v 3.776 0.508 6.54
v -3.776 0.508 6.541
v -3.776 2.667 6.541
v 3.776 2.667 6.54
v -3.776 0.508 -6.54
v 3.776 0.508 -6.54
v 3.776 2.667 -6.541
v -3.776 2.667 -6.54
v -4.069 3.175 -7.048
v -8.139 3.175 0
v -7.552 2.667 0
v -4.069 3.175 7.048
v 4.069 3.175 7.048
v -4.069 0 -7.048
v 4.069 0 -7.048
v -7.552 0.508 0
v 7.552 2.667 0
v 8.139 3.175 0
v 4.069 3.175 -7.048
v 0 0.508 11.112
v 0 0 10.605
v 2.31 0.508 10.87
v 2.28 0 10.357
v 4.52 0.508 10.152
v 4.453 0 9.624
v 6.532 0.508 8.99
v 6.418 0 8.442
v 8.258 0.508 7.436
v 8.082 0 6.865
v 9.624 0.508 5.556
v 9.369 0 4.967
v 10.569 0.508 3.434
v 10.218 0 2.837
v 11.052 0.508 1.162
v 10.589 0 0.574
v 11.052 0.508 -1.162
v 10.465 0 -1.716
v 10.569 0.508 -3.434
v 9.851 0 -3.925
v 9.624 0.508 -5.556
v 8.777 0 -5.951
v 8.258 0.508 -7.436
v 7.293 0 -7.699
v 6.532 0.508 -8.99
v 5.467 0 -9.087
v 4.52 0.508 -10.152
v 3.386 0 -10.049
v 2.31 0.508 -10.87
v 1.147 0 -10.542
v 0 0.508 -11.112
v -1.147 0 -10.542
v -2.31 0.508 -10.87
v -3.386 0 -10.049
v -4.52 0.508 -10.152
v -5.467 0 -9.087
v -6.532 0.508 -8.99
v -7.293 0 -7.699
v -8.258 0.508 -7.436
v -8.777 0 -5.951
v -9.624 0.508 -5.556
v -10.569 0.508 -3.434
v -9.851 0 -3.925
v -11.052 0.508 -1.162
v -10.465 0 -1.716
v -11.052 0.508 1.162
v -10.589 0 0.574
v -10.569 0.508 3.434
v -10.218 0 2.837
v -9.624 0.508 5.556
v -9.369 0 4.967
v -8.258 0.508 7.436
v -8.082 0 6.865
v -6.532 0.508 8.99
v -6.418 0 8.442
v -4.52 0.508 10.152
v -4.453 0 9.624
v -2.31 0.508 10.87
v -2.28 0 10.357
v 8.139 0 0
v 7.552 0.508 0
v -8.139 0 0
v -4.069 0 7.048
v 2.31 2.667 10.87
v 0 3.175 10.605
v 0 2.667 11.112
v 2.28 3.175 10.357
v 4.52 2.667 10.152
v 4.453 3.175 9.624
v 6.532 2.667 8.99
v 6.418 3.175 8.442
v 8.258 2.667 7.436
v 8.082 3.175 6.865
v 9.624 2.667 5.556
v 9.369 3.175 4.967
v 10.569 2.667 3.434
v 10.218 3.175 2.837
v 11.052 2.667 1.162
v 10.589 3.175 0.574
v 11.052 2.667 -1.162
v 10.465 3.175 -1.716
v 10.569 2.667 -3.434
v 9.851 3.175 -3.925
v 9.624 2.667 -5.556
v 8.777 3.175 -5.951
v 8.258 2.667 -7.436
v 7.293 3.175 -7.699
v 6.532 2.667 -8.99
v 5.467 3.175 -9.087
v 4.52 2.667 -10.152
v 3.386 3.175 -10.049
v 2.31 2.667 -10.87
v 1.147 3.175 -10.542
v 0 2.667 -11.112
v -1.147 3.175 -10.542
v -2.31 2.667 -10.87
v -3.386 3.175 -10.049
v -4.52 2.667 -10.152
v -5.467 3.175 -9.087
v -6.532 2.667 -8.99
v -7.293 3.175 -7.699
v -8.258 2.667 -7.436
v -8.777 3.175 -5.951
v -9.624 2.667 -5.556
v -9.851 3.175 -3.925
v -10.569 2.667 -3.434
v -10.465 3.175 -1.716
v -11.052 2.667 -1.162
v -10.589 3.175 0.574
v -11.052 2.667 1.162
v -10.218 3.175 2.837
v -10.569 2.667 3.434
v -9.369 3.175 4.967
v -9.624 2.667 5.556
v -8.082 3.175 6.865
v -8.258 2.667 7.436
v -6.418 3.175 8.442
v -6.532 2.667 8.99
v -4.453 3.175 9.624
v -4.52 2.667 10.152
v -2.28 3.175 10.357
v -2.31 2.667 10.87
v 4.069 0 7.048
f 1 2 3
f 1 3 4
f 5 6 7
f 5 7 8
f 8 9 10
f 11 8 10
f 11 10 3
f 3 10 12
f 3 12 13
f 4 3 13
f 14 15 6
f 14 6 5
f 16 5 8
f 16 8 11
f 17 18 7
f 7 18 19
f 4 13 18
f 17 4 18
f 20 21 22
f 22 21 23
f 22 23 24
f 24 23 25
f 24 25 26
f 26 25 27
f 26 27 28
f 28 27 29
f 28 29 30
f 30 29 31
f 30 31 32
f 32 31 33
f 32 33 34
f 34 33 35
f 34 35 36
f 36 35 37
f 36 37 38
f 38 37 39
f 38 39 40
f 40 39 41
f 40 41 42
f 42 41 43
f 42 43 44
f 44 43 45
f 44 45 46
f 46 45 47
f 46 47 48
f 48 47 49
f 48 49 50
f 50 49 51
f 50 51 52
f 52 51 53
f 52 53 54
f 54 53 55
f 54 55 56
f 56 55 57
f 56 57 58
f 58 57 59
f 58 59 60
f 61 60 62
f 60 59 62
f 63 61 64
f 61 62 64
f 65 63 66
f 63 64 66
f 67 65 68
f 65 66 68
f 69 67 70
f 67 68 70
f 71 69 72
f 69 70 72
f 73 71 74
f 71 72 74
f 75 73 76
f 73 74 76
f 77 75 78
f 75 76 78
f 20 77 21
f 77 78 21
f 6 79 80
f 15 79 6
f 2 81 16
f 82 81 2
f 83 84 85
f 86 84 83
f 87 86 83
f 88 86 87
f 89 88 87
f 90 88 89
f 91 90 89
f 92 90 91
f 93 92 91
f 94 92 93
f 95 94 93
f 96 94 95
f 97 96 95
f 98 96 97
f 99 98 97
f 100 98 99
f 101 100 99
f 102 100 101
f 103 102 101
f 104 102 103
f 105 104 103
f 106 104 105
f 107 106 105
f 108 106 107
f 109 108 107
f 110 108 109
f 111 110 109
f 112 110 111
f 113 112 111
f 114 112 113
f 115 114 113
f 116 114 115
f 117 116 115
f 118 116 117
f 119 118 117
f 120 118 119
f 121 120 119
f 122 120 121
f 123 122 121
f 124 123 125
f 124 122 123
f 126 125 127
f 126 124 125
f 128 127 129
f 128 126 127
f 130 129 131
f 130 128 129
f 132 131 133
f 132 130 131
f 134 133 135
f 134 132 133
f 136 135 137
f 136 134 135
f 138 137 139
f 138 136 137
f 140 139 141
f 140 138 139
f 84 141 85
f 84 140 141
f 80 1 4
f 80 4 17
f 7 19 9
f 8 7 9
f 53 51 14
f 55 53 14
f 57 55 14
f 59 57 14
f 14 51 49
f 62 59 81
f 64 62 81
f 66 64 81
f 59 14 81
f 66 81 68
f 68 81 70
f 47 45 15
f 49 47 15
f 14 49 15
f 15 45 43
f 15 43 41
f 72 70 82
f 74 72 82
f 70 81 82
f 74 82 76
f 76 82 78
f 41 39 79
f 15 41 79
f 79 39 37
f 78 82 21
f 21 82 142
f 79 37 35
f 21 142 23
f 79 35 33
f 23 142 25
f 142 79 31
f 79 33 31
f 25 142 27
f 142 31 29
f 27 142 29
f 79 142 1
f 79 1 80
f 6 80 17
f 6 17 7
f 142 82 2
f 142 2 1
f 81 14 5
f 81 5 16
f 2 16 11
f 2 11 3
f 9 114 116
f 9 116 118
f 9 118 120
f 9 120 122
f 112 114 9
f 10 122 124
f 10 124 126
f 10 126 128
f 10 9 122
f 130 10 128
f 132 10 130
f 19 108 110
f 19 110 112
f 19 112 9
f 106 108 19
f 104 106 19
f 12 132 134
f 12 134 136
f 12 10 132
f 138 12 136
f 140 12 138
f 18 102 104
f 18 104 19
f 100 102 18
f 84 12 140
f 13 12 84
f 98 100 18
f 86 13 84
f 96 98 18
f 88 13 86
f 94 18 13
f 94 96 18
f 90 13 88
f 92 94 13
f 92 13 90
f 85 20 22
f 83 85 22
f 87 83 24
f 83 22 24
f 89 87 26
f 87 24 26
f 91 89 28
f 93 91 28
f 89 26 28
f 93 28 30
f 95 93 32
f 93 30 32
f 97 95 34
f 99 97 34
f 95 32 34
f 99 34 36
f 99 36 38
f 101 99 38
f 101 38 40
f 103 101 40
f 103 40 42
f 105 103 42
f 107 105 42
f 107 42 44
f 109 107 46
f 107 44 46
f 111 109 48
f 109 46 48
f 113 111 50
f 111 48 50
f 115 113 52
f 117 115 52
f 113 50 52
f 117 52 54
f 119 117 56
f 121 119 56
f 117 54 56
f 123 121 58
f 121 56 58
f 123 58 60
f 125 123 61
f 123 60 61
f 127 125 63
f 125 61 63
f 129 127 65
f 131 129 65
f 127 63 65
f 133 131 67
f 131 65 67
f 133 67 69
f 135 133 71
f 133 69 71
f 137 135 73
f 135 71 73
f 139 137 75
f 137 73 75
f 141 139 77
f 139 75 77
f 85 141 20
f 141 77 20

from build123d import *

# Parameters (mm, degrees)
SKETCH1_R           = 11.1125
BOSS_EXTRUDE1_DEPTH = 3.175
CHAMFER1_SIZE       = 0.508


with BuildPart() as part:
    # Sketch1 → Boss-Extrude1 (new body)
    with BuildSketch(Plane(origin=(0, 0, 0), x_dir=(1, 0, 0), z_dir=(0, 1, 0))):
        with Locations(Location((0, 0, 0), (0, 0, 270))):
            Circle(SKETCH1_R)
        Polygon((7.552318871, 0), (3.776159436, 6.5405), (-3.776159436, 6.5405), (-7.552318871, 0), (-3.776159436, -6.5405), (3.776159436, -6.5405), align=None, mode=Mode.SUBTRACT)
    extrude(amount=BOSS_EXTRUDE1_DEPTH)

    # Chamfer1
    chamfer1_edges = [part.edges().sort_by_distance(p)[0] for p in [
        (0, 0, -6.5405),
        (-5.664239153, 0, -3.27025),
        (-5.664239153, 0, 3.27025),
        (0, 0, 6.5405),
        (5.664239153, 3.175, 3.27025),
        (5.664239153, 3.175, -3.27025),
        (0, 3.175, -6.5405),
        (-5.664239153, 3.175, -3.27025),
        (-5.664239153, 3.175, 3.27025),
        (0, 3.175, 6.5405),
        (0, 0, -11.1125),
        (0, 3.175, -11.1125),
        (5.664239153, 0, 3.27025),
        (5.664239153, 0, -3.27025),
    ]]
    chamfer(chamfer1_edges, length=CHAMFER1_SIZE)


solid = part.part
